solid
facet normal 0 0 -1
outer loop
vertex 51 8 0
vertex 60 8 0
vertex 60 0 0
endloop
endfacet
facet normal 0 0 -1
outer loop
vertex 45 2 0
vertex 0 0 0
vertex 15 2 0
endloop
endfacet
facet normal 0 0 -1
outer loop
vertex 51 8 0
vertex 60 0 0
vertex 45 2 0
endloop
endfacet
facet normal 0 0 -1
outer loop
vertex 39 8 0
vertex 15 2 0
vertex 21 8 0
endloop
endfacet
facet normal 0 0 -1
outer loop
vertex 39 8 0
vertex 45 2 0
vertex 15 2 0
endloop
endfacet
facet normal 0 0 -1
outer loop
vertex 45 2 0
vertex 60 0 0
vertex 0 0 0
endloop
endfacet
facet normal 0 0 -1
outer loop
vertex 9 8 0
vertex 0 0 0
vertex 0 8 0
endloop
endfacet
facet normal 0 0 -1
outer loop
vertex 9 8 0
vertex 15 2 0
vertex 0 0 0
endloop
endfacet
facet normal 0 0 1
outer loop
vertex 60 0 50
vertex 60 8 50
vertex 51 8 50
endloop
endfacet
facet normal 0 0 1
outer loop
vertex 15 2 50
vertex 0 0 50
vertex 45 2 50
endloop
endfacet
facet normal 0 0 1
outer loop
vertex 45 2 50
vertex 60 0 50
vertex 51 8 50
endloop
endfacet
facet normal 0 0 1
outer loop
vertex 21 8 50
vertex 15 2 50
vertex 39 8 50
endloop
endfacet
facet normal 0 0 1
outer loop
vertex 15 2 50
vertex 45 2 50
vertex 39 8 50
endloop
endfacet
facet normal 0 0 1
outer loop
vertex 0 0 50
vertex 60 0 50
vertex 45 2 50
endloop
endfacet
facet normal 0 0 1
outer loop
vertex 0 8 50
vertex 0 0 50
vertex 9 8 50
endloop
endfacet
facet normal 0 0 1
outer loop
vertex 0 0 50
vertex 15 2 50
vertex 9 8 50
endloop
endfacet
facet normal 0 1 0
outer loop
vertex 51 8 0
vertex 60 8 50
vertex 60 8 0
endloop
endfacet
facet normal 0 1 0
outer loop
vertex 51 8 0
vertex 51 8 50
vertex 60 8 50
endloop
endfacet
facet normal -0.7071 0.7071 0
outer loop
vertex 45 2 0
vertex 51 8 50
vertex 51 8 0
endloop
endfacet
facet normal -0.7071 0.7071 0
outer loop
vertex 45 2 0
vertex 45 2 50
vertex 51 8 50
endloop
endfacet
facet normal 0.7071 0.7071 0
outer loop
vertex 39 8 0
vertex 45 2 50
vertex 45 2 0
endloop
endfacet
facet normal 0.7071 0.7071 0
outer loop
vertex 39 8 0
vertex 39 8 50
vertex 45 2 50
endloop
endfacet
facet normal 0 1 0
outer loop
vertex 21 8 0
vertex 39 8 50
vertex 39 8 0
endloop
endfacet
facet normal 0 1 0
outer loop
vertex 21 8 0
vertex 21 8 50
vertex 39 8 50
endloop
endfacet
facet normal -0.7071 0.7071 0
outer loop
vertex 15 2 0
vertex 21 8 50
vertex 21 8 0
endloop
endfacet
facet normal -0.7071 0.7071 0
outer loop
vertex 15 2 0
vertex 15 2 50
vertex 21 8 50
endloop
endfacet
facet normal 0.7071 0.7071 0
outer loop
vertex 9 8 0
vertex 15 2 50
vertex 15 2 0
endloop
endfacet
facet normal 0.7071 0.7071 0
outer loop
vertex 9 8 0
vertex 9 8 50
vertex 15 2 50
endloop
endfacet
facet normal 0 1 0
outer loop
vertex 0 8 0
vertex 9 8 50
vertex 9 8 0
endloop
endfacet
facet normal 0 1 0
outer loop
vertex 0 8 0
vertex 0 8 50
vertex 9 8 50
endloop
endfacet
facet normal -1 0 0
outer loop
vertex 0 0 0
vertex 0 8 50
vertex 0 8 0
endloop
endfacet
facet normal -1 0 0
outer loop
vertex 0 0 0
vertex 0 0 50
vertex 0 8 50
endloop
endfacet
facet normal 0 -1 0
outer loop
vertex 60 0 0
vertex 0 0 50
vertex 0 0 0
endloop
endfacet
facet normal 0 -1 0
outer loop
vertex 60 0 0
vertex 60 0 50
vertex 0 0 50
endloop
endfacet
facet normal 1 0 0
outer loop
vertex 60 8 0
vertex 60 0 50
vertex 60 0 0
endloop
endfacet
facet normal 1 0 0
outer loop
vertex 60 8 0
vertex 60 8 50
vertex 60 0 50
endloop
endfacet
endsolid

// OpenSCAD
$fn = 32;

// ----------------------------------------------------------------------
// V guide rail: doublev, 60 mm wide
// ----------------------------------------------------------------------

// --- parameters (mm) ---
rail_w = 60;              // rail width, X
base_t = 8;               // base plate thickness
v_depth = 6;              // V feature depth / height
v_half_w = 12;            // half width of the V at the base face
plate_t = 50;             // rail length, Z (the extrusion height)
groove_off = 15;          // offset of each groove from the centreline

centre_x = rail_w / 2;  // rail centreline
groove_a = centre_x - groove_off;  // axis of the first groove
groove_b = centre_x + groove_off;  // axis of the second groove

profile = [[0, 0], [60, 0], [60, 8], [51, 8], [45, 2], [39, 8], [21, 8], [15, 2], [9, 8], [0, 8]];  // primary outline, 10 points, counter clockwise

// --- the one profile operation ---
linear_extrude(height = plate_t) polygon(points = profile);
